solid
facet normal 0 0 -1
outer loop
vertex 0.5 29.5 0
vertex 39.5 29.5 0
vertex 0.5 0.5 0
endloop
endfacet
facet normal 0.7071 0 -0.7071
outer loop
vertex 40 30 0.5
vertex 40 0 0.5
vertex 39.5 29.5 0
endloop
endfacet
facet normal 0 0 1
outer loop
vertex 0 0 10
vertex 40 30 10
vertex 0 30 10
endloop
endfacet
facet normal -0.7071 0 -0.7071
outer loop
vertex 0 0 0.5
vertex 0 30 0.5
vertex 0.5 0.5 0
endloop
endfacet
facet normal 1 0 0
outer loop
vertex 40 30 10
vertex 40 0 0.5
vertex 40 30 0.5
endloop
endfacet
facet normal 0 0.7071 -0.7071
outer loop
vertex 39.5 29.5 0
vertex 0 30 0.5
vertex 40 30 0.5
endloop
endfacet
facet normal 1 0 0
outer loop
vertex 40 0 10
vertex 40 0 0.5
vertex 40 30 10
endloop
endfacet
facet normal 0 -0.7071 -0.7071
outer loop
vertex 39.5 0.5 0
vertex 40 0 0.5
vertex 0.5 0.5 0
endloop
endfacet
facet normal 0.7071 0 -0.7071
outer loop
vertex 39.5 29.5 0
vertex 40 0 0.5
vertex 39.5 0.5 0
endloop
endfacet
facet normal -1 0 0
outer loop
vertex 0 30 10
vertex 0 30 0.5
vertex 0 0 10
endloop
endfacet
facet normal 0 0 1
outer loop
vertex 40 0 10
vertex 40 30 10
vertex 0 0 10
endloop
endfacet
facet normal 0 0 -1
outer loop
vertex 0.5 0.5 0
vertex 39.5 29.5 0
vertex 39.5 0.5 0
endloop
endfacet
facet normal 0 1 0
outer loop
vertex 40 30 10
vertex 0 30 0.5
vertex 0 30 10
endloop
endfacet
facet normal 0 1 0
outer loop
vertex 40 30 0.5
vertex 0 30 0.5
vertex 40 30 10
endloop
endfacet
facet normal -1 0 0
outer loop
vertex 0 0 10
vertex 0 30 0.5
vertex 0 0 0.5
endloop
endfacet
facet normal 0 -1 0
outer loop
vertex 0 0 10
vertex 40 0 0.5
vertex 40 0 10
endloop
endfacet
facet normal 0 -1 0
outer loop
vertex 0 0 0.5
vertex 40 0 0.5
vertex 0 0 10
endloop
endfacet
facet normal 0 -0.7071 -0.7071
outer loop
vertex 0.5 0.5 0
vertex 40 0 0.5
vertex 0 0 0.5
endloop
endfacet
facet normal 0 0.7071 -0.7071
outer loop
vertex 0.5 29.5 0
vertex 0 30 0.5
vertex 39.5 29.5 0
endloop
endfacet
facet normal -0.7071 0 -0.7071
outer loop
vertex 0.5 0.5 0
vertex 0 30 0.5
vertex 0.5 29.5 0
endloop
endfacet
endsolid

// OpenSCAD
// {{NAME}}
// Units: millimeters. Edit the parameters, then export:
//   openscad -o model.stl model.scad

/* [Size] */
width  = 40;
depth  = 30;
height = 10;

/* [Print tuning - see knowledge/design-rules.md] */
wall      = 1.6;   // 4 perimeters at 0.4 mm nozzle
clearance = 0.3;   // added to holes / mating parts
chamfer   = 0.5;   // bottom edge chamfer, hides elephant's foot

$fn = 64;

// Box with a chamfered bottom edge so the first layer doesn't flare out.
module chamfered_block(size, c) {
    hull() {
        translate([c, c, 0]) cube([size.x - 2 * c, size.y - 2 * c, c]);
        translate([0, 0, c]) cube([size.x, size.y, size.z - c]);
    }
}

chamfered_block([width, depth, height], chamfer);
